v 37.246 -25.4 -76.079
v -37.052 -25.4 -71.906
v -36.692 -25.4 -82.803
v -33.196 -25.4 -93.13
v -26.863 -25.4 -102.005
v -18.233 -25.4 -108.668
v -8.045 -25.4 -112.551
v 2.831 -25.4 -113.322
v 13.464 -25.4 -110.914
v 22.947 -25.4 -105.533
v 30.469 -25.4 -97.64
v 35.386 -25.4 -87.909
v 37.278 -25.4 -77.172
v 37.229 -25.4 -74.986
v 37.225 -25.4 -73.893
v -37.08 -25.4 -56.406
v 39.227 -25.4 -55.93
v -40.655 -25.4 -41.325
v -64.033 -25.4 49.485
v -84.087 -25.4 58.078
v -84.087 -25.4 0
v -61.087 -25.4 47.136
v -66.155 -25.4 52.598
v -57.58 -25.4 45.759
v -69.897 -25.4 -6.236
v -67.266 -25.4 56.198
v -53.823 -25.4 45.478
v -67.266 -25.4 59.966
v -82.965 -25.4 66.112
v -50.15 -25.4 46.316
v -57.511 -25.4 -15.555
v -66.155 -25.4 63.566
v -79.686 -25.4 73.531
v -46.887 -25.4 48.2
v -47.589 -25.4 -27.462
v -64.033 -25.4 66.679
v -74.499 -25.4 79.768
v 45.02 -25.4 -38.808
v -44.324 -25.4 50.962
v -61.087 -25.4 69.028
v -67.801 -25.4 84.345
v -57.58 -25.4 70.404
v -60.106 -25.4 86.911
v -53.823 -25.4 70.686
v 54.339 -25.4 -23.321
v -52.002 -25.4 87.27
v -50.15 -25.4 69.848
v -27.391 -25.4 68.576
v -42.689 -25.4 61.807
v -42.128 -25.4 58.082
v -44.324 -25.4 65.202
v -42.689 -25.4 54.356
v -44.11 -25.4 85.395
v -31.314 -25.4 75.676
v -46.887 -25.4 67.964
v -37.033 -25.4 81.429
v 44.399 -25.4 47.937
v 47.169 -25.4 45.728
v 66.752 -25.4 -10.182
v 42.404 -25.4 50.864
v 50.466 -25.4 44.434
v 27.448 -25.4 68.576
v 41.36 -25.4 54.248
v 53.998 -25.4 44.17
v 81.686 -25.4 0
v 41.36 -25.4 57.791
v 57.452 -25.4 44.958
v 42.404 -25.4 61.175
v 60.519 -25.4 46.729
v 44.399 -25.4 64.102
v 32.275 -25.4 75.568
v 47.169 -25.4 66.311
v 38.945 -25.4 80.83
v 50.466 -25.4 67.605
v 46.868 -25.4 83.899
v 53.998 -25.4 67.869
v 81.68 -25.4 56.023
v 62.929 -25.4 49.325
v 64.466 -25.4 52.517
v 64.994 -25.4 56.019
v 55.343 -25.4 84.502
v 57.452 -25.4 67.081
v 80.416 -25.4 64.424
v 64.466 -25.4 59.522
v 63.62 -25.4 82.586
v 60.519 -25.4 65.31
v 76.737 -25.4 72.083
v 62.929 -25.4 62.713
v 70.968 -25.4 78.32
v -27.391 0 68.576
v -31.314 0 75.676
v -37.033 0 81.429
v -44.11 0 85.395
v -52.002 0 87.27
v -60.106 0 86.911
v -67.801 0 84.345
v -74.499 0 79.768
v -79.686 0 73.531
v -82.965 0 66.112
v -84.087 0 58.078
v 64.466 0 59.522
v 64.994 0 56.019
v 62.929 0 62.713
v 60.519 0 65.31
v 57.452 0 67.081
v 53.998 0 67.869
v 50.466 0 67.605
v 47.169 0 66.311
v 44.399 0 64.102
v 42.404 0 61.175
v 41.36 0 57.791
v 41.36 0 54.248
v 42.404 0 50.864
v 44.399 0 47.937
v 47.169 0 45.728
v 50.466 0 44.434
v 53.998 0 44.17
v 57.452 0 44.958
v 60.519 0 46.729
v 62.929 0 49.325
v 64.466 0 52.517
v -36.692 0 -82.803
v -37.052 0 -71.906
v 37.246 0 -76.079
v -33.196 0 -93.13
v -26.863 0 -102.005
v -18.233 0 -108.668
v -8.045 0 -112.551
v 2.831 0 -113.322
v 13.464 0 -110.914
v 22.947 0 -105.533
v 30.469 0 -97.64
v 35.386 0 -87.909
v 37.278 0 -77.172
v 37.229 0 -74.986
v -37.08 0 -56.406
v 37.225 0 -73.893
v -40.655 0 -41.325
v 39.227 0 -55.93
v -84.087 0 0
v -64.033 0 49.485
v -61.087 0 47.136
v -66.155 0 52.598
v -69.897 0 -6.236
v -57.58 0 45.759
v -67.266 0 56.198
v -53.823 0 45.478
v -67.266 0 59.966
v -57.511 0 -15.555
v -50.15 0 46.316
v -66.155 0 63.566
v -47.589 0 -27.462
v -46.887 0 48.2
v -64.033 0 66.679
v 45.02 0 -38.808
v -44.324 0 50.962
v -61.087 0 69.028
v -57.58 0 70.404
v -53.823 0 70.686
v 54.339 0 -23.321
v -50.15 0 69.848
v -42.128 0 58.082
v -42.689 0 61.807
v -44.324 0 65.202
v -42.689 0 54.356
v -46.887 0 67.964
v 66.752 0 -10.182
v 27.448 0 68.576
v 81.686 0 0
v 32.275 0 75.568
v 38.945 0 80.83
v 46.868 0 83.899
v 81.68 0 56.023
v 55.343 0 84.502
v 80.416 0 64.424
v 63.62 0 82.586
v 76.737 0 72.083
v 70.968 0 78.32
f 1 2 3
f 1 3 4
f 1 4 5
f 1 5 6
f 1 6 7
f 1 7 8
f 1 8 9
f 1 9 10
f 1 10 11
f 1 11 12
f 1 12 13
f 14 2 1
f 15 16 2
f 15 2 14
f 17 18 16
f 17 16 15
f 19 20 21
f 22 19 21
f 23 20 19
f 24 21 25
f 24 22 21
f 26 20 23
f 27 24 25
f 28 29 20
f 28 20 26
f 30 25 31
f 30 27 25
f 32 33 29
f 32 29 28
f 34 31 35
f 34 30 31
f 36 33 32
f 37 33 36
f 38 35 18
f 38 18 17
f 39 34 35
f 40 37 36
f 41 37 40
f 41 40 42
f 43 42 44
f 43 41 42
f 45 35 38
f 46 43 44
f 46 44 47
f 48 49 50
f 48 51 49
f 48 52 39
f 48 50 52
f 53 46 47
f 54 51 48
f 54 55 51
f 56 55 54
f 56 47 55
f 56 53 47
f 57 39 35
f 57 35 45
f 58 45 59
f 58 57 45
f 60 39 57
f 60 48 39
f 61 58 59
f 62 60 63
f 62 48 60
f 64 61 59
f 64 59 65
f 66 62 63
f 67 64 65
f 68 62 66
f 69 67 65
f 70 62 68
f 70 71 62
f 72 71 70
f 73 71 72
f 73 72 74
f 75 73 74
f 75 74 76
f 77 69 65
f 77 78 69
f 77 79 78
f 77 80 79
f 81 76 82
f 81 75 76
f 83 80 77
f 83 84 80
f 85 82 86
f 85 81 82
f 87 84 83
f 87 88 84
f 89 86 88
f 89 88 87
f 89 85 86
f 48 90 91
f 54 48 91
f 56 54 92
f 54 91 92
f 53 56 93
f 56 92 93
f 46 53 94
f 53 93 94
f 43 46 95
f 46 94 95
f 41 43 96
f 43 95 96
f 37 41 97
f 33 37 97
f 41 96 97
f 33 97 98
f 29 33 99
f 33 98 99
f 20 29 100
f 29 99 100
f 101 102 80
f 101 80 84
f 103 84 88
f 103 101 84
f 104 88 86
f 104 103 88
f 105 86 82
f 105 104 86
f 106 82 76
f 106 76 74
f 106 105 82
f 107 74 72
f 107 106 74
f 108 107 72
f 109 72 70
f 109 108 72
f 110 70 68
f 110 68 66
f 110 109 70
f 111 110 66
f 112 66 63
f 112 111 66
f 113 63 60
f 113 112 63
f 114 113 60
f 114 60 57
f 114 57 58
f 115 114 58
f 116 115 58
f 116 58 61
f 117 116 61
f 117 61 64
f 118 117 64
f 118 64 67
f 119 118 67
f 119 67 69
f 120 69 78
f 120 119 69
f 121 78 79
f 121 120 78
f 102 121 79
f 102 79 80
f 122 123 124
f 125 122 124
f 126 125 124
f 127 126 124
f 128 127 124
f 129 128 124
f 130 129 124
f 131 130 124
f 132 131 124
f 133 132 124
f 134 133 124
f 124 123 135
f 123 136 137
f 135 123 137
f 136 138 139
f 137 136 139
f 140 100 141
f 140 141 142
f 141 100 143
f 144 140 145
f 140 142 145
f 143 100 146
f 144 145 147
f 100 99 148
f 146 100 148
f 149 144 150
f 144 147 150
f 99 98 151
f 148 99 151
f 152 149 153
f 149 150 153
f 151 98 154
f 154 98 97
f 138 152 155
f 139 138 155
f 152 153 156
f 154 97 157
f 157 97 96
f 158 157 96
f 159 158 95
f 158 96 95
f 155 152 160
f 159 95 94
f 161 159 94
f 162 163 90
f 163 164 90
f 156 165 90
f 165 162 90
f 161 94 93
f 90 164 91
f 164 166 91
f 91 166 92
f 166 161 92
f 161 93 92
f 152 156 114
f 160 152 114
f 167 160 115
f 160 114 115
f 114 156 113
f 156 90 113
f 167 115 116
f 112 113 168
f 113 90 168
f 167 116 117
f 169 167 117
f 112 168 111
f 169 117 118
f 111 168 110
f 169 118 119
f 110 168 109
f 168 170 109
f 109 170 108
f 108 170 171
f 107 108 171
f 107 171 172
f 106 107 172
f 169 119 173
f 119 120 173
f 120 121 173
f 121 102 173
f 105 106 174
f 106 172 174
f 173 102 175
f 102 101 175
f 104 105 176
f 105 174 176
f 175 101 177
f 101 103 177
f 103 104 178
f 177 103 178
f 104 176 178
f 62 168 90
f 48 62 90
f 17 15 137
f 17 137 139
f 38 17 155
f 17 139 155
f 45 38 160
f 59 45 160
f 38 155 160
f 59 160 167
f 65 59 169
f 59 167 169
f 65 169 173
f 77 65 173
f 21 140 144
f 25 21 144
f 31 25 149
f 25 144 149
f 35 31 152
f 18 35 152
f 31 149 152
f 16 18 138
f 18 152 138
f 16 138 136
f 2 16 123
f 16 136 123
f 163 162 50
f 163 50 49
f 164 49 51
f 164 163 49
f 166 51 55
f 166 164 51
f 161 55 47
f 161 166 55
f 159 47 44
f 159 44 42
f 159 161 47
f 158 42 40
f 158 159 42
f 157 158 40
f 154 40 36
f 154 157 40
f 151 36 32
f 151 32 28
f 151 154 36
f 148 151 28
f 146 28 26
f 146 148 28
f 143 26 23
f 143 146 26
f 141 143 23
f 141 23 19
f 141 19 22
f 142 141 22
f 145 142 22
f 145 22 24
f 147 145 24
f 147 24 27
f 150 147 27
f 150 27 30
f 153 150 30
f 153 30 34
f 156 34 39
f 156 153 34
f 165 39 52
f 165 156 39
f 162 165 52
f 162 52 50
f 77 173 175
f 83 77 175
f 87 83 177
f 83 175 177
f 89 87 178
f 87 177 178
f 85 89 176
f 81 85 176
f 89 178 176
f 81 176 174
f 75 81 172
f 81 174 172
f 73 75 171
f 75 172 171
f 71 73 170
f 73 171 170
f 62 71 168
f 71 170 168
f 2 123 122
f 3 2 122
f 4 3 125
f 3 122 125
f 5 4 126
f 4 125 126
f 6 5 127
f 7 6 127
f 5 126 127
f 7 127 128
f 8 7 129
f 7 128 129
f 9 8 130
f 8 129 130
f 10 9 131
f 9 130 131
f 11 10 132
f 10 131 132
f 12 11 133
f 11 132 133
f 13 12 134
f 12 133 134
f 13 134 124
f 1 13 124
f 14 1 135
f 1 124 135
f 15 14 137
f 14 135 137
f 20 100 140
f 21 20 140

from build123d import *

# Parameters (mm, degrees)
F0_R     = 12.639572
F0_R_2   = 11.88315
F1_DEPTH = 25.4


with BuildPart() as f1:
    # F0 (on Front) → F1 (new body)
    with BuildSketch(Plane.XZ):
        with BuildLine():
            Line((27.448043, 68.576015), (-27.390932, 68.576015))
            ThreePointArc((-27.390932, 68.576015), (-60.105703, 86.910739), (-84.08658, 58.077842))
            Line((-84.08658, 58.077842), (-84.08658, 0))
            ThreePointArc((-84.08658, 0), (-47.588606, -27.462088), (-37.051876, -71.905824))
            ThreePointArc((-37.051876, -71.905824), (-2.635407, -113.336224), (37.278298, -77.171771))
            ThreePointArc((37.278298, -77.171771), (37.23573, -75.532835), (37.225122, -73.893381))
            ThreePointArc((37.225122, -73.893381), (49.262547, -30.813467), (81.686439, 0))
            Line((81.686439, 0), (81.680074, 56.022676))
            ThreePointArc((81.680074, 56.022676), (59.553216, 83.853143), (27.448043, 68.576015))
        make_face()
        with Locations((-54.767519, 58.081741)):
            Circle(F0_R, mode=Mode.SUBTRACT)
        with Locations((53.110417, 56.019429)):
            Circle(F0_R_2, mode=Mode.SUBTRACT)
    extrude(amount=F1_DEPTH)


solid = f1.part
